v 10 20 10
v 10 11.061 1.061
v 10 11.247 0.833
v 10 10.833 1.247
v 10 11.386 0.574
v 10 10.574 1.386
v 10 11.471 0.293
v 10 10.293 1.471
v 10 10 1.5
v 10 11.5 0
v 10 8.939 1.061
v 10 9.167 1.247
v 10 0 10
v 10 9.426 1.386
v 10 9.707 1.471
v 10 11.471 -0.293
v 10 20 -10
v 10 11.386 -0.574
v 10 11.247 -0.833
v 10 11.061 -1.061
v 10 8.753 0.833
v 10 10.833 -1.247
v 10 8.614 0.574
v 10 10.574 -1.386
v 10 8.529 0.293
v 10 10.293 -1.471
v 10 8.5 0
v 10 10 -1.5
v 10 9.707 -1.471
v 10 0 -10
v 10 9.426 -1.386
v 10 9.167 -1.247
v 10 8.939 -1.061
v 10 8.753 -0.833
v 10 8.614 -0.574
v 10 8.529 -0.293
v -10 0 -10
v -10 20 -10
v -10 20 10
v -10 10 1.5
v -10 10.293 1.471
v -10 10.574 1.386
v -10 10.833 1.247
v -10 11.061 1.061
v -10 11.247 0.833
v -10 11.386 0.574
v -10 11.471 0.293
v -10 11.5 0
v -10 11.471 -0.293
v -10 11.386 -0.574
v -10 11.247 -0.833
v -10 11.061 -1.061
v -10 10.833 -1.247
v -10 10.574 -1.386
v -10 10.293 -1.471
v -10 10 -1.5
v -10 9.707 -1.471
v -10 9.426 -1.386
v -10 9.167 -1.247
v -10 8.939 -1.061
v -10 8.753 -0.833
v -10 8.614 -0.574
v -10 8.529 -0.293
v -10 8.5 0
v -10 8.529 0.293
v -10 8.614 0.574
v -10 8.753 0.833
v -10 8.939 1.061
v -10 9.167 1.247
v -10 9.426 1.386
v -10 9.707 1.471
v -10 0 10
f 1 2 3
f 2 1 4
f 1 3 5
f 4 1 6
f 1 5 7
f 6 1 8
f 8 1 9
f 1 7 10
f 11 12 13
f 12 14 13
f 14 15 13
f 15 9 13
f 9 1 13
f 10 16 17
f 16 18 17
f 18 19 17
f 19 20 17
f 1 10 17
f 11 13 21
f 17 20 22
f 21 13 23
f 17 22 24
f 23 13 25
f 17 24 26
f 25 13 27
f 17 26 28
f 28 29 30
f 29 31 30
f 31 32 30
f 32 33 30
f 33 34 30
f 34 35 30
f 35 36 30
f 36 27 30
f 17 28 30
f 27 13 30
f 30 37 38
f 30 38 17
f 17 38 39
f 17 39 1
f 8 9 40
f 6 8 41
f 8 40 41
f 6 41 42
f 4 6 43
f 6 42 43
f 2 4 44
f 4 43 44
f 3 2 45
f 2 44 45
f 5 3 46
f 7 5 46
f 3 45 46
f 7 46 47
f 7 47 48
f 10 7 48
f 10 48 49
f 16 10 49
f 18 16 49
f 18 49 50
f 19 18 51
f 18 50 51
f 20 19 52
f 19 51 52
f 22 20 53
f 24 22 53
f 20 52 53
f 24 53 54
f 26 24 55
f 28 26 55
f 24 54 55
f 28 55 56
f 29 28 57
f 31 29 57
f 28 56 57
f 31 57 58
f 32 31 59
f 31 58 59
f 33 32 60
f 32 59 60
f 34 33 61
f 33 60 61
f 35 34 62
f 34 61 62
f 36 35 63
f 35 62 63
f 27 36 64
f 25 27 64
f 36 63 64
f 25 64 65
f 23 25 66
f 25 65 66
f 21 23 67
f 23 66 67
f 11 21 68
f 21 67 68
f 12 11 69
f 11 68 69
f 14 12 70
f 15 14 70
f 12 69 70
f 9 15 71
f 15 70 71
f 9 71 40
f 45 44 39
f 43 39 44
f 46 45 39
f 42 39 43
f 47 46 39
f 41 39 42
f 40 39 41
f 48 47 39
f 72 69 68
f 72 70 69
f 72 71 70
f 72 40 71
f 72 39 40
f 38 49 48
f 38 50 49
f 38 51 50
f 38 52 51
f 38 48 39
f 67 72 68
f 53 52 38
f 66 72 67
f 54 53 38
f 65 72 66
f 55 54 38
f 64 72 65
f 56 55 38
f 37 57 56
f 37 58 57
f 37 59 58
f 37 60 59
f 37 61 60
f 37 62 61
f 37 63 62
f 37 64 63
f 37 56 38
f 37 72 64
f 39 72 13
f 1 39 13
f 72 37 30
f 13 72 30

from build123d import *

# Parameters (mm, degrees)
SKETCH1_W           = 20
SKETCH1_H           = 20
BOSS_EXTRUDE1_DEPTH = 20
SKETCH3_R           = 1.5
CUT_EXTRUDE1_DEPTH  = 20


with BuildPart() as part:
    # Sketch1 → Boss-Extrude1 (new body)
    with BuildSketch(Plane(origin=(0, 0, 0), x_dir=(1, 0, 0), z_dir=(0, 1, 0))):
        Rectangle(SKETCH1_W, SKETCH1_H)
    extrude(amount=BOSS_EXTRUDE1_DEPTH)

    # Sketch3 → Cut-Extrude1 (cut)
    with BuildSketch(Plane.ZY.offset(10)):
        with Locations((0, 10)):
            Circle(SKETCH3_R)
    extrude(amount=-CUT_EXTRUDE1_DEPTH, mode=Mode.SUBTRACT)


solid = part.part
